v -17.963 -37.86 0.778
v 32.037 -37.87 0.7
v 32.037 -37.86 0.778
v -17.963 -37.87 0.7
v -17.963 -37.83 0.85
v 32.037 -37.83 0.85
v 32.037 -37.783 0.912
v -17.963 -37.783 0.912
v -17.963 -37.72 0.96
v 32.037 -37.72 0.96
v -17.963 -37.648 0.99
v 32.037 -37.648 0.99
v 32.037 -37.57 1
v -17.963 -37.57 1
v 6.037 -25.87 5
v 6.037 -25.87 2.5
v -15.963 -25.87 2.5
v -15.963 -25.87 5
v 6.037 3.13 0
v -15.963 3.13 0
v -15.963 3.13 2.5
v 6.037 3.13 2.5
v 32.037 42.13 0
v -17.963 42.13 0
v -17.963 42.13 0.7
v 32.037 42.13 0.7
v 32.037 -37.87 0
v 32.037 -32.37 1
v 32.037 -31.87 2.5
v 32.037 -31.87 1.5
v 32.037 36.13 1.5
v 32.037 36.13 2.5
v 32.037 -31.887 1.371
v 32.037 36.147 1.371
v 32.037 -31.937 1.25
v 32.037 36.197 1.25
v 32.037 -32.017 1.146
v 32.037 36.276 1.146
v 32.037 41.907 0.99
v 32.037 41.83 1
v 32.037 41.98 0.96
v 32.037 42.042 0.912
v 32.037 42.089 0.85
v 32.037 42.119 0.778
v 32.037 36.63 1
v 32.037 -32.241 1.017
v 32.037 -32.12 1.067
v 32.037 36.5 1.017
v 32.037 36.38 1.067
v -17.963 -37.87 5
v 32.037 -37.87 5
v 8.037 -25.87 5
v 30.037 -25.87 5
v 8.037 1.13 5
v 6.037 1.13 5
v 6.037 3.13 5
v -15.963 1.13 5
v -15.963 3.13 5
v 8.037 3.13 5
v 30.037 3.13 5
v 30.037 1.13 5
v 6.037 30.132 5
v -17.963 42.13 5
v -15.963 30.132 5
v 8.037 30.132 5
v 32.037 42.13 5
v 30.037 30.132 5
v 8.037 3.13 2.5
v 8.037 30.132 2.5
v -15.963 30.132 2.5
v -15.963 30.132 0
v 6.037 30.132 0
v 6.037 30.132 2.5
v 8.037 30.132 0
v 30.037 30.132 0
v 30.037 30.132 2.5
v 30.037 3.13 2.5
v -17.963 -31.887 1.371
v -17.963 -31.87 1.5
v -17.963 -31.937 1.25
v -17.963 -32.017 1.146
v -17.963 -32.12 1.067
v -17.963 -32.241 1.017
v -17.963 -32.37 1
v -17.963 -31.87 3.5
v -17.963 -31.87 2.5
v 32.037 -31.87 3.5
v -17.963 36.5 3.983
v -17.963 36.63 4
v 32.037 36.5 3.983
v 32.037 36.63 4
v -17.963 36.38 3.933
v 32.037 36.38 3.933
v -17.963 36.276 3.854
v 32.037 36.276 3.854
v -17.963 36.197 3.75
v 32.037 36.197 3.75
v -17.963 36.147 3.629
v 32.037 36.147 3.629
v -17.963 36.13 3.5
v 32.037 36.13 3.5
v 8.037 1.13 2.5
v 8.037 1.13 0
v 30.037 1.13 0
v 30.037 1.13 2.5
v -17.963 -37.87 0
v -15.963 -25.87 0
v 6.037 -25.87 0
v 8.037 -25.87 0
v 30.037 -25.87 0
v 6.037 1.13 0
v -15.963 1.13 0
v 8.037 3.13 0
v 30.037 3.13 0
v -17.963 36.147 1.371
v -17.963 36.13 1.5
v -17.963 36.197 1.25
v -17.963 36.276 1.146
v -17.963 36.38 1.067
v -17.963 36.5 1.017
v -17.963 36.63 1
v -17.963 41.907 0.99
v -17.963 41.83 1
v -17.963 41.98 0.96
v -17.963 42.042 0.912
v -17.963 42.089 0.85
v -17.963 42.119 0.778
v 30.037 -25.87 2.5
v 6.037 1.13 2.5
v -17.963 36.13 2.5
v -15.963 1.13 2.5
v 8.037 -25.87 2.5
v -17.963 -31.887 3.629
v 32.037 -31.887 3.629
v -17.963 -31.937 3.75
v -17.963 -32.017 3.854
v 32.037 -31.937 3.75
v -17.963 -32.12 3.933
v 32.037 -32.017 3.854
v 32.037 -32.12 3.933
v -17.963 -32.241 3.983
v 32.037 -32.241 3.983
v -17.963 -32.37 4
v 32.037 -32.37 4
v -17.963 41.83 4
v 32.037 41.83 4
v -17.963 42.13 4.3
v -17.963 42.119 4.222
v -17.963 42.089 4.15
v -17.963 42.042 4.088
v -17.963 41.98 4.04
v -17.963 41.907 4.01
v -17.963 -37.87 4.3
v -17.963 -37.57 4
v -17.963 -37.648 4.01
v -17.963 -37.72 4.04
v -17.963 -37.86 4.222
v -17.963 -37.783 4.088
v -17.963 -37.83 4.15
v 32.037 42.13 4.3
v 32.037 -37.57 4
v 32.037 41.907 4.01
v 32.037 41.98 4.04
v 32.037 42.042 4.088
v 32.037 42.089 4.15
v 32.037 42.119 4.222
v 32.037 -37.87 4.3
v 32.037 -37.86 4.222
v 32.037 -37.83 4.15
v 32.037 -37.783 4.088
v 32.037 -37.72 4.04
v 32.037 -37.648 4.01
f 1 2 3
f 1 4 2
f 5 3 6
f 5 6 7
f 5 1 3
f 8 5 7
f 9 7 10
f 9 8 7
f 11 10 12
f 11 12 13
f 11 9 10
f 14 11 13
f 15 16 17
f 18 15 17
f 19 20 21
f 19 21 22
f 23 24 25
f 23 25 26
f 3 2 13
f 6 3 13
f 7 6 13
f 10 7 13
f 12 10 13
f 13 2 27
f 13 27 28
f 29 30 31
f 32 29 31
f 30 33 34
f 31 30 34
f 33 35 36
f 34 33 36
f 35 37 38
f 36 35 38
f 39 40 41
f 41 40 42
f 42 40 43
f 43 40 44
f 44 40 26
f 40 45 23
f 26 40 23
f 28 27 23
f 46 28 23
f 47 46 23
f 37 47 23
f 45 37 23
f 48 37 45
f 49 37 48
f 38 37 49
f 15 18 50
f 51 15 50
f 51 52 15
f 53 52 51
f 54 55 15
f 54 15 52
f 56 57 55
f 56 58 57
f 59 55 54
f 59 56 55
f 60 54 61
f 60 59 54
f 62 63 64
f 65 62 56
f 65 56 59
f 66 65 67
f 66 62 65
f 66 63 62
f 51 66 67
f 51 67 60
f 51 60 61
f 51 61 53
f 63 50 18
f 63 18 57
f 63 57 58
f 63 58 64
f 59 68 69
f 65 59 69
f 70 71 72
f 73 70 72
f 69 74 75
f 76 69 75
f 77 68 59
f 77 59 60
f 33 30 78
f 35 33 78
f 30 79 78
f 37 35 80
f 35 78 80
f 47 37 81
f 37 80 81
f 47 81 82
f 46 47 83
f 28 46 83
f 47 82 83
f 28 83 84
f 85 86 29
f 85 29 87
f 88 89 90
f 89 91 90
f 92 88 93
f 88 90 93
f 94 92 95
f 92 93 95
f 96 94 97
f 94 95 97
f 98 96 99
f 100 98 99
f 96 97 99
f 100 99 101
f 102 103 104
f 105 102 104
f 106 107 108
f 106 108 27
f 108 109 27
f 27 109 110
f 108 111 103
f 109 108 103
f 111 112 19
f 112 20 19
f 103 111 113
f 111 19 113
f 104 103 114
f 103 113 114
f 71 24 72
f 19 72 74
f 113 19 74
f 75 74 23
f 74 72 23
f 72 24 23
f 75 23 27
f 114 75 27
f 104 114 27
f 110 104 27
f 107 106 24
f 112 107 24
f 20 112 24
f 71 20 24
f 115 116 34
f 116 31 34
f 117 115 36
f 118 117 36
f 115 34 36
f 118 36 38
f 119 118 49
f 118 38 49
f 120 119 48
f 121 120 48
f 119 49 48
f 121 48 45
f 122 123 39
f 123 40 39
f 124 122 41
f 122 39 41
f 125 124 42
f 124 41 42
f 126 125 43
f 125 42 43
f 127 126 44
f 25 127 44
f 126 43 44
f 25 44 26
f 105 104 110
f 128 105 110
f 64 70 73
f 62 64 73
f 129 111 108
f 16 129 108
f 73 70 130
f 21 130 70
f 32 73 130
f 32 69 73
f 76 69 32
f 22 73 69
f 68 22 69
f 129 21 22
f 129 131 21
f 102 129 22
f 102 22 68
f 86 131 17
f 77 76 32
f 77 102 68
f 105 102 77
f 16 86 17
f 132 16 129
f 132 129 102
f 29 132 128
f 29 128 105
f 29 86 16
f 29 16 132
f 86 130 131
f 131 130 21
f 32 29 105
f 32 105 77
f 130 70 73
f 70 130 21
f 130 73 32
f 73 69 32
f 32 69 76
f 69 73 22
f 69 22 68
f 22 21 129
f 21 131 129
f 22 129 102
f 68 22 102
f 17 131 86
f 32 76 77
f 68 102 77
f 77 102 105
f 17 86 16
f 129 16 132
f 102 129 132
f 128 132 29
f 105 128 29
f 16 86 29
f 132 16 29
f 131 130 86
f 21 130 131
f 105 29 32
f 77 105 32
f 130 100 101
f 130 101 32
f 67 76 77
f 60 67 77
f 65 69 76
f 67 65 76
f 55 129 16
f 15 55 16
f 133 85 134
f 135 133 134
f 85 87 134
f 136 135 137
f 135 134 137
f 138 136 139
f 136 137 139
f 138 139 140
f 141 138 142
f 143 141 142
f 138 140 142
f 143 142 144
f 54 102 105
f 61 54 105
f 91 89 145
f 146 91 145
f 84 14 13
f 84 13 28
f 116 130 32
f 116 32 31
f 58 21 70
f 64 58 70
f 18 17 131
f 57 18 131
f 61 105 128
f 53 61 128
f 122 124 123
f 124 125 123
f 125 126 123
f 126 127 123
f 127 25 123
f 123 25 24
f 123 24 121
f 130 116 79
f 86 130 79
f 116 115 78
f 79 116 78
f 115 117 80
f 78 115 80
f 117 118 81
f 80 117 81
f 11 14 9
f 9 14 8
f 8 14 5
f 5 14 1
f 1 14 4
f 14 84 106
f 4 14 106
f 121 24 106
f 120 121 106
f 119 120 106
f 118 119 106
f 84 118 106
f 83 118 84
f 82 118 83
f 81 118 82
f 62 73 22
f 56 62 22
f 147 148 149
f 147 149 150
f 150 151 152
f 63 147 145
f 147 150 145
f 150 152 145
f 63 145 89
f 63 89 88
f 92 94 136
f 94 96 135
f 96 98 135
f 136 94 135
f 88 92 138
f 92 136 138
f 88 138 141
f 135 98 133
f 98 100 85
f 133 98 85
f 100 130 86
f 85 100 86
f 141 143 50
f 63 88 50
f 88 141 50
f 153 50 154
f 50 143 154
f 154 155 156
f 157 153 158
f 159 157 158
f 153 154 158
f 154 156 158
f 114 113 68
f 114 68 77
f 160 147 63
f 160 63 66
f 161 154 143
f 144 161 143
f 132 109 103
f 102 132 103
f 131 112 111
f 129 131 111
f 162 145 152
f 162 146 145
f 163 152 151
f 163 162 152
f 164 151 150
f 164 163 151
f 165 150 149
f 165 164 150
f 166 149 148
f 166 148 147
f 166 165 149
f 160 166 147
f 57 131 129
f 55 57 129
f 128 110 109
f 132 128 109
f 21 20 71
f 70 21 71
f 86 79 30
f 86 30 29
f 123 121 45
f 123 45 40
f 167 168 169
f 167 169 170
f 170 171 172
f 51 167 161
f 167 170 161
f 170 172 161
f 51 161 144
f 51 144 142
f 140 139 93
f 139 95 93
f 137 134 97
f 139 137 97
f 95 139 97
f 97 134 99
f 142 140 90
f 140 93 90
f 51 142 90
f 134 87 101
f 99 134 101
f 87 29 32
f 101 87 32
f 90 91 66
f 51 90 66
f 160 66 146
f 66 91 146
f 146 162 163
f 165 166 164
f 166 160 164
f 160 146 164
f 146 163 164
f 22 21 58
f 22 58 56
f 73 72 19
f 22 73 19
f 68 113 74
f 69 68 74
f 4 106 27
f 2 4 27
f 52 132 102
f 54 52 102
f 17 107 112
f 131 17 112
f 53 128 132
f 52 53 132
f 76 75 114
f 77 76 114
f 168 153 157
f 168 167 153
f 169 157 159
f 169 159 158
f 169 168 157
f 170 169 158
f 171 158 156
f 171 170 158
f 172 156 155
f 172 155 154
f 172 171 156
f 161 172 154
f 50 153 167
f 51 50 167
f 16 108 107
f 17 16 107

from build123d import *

# Parameters (mm, degrees)
ESBO_O1_W                  = 50
ESBO_O1_H                  = 10
ESBO_O1_W_2                = 22
ESBO_O1_H_2                = 1
RESSALTO_EXTRUS_O1_DEPTH   = 5
ESBO_O2_W                  = 1.5
ESBO_O2_H                  = 6
CORTE_EXTRUS_O2_DEPTH      = 54.162744802
CORTE_EXTRUS_O2_DEPTH_BACK = 54.162744802
FILETE3_R                  = 0.5
FILETE4_R                  = 0.3
DIVIDIR1_SURFACE_1_BACK    = 95.472
DIVIDIR1_SURFACE_1_DEPTH   = 190.944
DIVIDIR1_SURFACE_2_BACK    = 95.472
DIVIDIR1_SURFACE_2_DEPTH   = 190.944


with BuildPart() as part:
    # Esboço1 → Ressalto-extrusão1 (new body)
    with BuildSketch(Plane.XY):
        Polygon((-15.962962963, 32.12962963), (-17.962962963, 32.12962963), (-17.962962963, 30.132116639), (-17.962962963, 3.12962963), (-17.962962963, 1.12962963), (-17.962962963, -25.87037037), (-17.962962963, -27.87037037), (-15.962962963, -27.87037037), (6.037037037, -27.87037037), (8.037037037, -27.87037037), (30.037037037, -27.87037037), (32.037037037, -27.87037037), (32.037037037, -25.87037037), (32.037037037, 1.12962963), (32.037037037, 3.12962963), (32.037037037, 30.132116639), (32.037037037, 32.12962963), (30.037037037, 32.12962963), (8.037037037, 32.12962963), (6.037037037, 32.12962963), align=None)
        Polygon((6.037037037, 30.132116639), (7.037037037, 30.132116639), (8.037037037, 30.132116639), (30.037037037, 30.132116639), (30.037037037, 3.12962963), (30.037037037, 2.12962963), (30.037037037, 1.12962963), (30.037037037, -25.87037037), (8.037037037, -25.87037037), (7.037037037, -25.87037037), (6.037037037, -25.87037037), (-15.962962963, -25.87037037), (-15.962962963, 1.12962963), (-15.962962963, 2.12962963), (-15.962962963, 3.12962963), (-15.962962963, 30.132116639), align=None, mode=Mode.SUBTRACT)
        with Locations((7.037037037, -32.87037037)):
            Rectangle(ESBO_O1_W, ESBO_O1_H)
        Polygon((8.037037037, 30.132116639), (7.037037037, 30.132116639), (7.037037037, -25.87037037), (8.037037037, -25.87037037), (8.037037037, 1.12962963), (8.037037037, 2.12962963), (8.037037037, 3.12962963), align=None)
        Polygon((7.037037037, -25.87037037), (7.037037037, 30.132116639), (6.037037037, 30.132116639), (6.037037037, 3.12962963), (6.037037037, 2.12962963), (6.037037037, 1.12962963), (6.037037037, -25.87037037), align=None)
        with Locations((19.037037037, 2.62962963)):
            Rectangle(ESBO_O1_W_2, ESBO_O1_H_2)
        with Locations((19.037037037, 1.62962963)):
            Rectangle(ESBO_O1_W_2, ESBO_O1_H_2)
        with Locations((-4.962962963, 2.62962963)):
            Rectangle(ESBO_O1_W_2, ESBO_O1_H_2)
        with Locations((-4.962962963, 1.62962963)):
            Rectangle(ESBO_O1_W_2, ESBO_O1_H_2)
        with Locations((7.037037037, 37.12962963)):
            Rectangle(ESBO_O1_W, ESBO_O1_H)
    extrude(amount=RESSALTO_EXTRUS_O1_DEPTH)

    # Esboço2 → Corte-extrusão2 (cut, two sides)
    with BuildSketch(Plane(origin=(0, 0, 0), x_dir=(0, 0, -1), z_dir=(1, 0, 0))) as corte_extrus_o2_sk:
        with Locations((-3.25, -34.87037037)):
            Rectangle(ESBO_O2_W, ESBO_O2_H)
        with Locations((-1.75, -34.87037037)):
            Rectangle(ESBO_O2_W, ESBO_O2_H)
        with Locations((-3.25, 39.12962963)):
            Rectangle(ESBO_O2_W, ESBO_O2_H)
        with Locations((-1.75, 39.12962963)):
            Rectangle(ESBO_O2_W, ESBO_O2_H)
    extrude(amount=CORTE_EXTRUS_O2_DEPTH, mode=Mode.SUBTRACT)
    extrude(corte_extrus_o2_sk.sketch, amount=-CORTE_EXTRUS_O2_DEPTH_BACK, mode=Mode.SUBTRACT)

    # Filete3
    filete3_edges = [part.edges().sort_by_distance(p)[0] for p in [
        (7.037037037, -31.87037037, 4),
        (7.037037037, -31.87037037, 1),
        (7.037037037, 36.12962963, 1),
        (7.037037037, 36.12962963, 4),
    ]]
    fillet(filete3_edges, radius=FILETE3_R)

    # Filete4
    filete4_edges = [part.edges().sort_by_distance(p)[0] for p in [
        (7.037037037, -37.87037037, 1),
        (7.037037037, -37.87037037, 4),
        (7.037037037, 42.12962963, 4),
        (7.037037037, 42.12962963, 1),
    ]]
    fillet(filete4_edges, radius=FILETE4_R)


with BuildPart() as body_2:
    # Dividir1: the piece behind the surface
    add(part.part)
    # Dividir1 surface: a surface, the sketch's curves swept straight by 190.944 mm
    with BuildLine(Plane(origin=(0, 0, 0), x_dir=(1, 0, 0), z_dir=(0, 1, 0)).offset(-DIVIDIR1_SURFACE_1_BACK), mode=Mode.PRIVATE) as dividir1_surface_1_path:
        Line((-17.962962963, -2.5), (32.037037037, -2.5))
    dividir1_surface_1 = Shell.extrude(dividir1_surface_1_path.wire(), (0 * DIVIDIR1_SURFACE_1_DEPTH, 1 * DIVIDIR1_SURFACE_1_DEPTH, 0 * DIVIDIR1_SURFACE_1_DEPTH))
    split(bisect_by=dividir1_surface_1, keep=Keep.BOTTOM)


with BuildPart() as part_1:
    add(part.part)

    # Dividir1: split by a surface, the side it looks to stays
    # Dividir1 surface: a surface, the sketch's curves swept straight by 190.944 mm
    with BuildLine(Plane(origin=(0, 0, 0), x_dir=(1, 0, 0), z_dir=(0, 1, 0)).offset(-DIVIDIR1_SURFACE_2_BACK), mode=Mode.PRIVATE) as dividir1_surface_2_path:
        Line((-17.962962963, -2.5), (32.037037037, -2.5))
    dividir1_surface_2 = Shell.extrude(dividir1_surface_2_path.wire(), (0 * DIVIDIR1_SURFACE_2_DEPTH, 1 * DIVIDIR1_SURFACE_2_DEPTH, 0 * DIVIDIR1_SURFACE_2_DEPTH))
    split(bisect_by=dividir1_surface_2, keep=Keep.TOP)


solid = Compound([body_2.part, part_1.part])
